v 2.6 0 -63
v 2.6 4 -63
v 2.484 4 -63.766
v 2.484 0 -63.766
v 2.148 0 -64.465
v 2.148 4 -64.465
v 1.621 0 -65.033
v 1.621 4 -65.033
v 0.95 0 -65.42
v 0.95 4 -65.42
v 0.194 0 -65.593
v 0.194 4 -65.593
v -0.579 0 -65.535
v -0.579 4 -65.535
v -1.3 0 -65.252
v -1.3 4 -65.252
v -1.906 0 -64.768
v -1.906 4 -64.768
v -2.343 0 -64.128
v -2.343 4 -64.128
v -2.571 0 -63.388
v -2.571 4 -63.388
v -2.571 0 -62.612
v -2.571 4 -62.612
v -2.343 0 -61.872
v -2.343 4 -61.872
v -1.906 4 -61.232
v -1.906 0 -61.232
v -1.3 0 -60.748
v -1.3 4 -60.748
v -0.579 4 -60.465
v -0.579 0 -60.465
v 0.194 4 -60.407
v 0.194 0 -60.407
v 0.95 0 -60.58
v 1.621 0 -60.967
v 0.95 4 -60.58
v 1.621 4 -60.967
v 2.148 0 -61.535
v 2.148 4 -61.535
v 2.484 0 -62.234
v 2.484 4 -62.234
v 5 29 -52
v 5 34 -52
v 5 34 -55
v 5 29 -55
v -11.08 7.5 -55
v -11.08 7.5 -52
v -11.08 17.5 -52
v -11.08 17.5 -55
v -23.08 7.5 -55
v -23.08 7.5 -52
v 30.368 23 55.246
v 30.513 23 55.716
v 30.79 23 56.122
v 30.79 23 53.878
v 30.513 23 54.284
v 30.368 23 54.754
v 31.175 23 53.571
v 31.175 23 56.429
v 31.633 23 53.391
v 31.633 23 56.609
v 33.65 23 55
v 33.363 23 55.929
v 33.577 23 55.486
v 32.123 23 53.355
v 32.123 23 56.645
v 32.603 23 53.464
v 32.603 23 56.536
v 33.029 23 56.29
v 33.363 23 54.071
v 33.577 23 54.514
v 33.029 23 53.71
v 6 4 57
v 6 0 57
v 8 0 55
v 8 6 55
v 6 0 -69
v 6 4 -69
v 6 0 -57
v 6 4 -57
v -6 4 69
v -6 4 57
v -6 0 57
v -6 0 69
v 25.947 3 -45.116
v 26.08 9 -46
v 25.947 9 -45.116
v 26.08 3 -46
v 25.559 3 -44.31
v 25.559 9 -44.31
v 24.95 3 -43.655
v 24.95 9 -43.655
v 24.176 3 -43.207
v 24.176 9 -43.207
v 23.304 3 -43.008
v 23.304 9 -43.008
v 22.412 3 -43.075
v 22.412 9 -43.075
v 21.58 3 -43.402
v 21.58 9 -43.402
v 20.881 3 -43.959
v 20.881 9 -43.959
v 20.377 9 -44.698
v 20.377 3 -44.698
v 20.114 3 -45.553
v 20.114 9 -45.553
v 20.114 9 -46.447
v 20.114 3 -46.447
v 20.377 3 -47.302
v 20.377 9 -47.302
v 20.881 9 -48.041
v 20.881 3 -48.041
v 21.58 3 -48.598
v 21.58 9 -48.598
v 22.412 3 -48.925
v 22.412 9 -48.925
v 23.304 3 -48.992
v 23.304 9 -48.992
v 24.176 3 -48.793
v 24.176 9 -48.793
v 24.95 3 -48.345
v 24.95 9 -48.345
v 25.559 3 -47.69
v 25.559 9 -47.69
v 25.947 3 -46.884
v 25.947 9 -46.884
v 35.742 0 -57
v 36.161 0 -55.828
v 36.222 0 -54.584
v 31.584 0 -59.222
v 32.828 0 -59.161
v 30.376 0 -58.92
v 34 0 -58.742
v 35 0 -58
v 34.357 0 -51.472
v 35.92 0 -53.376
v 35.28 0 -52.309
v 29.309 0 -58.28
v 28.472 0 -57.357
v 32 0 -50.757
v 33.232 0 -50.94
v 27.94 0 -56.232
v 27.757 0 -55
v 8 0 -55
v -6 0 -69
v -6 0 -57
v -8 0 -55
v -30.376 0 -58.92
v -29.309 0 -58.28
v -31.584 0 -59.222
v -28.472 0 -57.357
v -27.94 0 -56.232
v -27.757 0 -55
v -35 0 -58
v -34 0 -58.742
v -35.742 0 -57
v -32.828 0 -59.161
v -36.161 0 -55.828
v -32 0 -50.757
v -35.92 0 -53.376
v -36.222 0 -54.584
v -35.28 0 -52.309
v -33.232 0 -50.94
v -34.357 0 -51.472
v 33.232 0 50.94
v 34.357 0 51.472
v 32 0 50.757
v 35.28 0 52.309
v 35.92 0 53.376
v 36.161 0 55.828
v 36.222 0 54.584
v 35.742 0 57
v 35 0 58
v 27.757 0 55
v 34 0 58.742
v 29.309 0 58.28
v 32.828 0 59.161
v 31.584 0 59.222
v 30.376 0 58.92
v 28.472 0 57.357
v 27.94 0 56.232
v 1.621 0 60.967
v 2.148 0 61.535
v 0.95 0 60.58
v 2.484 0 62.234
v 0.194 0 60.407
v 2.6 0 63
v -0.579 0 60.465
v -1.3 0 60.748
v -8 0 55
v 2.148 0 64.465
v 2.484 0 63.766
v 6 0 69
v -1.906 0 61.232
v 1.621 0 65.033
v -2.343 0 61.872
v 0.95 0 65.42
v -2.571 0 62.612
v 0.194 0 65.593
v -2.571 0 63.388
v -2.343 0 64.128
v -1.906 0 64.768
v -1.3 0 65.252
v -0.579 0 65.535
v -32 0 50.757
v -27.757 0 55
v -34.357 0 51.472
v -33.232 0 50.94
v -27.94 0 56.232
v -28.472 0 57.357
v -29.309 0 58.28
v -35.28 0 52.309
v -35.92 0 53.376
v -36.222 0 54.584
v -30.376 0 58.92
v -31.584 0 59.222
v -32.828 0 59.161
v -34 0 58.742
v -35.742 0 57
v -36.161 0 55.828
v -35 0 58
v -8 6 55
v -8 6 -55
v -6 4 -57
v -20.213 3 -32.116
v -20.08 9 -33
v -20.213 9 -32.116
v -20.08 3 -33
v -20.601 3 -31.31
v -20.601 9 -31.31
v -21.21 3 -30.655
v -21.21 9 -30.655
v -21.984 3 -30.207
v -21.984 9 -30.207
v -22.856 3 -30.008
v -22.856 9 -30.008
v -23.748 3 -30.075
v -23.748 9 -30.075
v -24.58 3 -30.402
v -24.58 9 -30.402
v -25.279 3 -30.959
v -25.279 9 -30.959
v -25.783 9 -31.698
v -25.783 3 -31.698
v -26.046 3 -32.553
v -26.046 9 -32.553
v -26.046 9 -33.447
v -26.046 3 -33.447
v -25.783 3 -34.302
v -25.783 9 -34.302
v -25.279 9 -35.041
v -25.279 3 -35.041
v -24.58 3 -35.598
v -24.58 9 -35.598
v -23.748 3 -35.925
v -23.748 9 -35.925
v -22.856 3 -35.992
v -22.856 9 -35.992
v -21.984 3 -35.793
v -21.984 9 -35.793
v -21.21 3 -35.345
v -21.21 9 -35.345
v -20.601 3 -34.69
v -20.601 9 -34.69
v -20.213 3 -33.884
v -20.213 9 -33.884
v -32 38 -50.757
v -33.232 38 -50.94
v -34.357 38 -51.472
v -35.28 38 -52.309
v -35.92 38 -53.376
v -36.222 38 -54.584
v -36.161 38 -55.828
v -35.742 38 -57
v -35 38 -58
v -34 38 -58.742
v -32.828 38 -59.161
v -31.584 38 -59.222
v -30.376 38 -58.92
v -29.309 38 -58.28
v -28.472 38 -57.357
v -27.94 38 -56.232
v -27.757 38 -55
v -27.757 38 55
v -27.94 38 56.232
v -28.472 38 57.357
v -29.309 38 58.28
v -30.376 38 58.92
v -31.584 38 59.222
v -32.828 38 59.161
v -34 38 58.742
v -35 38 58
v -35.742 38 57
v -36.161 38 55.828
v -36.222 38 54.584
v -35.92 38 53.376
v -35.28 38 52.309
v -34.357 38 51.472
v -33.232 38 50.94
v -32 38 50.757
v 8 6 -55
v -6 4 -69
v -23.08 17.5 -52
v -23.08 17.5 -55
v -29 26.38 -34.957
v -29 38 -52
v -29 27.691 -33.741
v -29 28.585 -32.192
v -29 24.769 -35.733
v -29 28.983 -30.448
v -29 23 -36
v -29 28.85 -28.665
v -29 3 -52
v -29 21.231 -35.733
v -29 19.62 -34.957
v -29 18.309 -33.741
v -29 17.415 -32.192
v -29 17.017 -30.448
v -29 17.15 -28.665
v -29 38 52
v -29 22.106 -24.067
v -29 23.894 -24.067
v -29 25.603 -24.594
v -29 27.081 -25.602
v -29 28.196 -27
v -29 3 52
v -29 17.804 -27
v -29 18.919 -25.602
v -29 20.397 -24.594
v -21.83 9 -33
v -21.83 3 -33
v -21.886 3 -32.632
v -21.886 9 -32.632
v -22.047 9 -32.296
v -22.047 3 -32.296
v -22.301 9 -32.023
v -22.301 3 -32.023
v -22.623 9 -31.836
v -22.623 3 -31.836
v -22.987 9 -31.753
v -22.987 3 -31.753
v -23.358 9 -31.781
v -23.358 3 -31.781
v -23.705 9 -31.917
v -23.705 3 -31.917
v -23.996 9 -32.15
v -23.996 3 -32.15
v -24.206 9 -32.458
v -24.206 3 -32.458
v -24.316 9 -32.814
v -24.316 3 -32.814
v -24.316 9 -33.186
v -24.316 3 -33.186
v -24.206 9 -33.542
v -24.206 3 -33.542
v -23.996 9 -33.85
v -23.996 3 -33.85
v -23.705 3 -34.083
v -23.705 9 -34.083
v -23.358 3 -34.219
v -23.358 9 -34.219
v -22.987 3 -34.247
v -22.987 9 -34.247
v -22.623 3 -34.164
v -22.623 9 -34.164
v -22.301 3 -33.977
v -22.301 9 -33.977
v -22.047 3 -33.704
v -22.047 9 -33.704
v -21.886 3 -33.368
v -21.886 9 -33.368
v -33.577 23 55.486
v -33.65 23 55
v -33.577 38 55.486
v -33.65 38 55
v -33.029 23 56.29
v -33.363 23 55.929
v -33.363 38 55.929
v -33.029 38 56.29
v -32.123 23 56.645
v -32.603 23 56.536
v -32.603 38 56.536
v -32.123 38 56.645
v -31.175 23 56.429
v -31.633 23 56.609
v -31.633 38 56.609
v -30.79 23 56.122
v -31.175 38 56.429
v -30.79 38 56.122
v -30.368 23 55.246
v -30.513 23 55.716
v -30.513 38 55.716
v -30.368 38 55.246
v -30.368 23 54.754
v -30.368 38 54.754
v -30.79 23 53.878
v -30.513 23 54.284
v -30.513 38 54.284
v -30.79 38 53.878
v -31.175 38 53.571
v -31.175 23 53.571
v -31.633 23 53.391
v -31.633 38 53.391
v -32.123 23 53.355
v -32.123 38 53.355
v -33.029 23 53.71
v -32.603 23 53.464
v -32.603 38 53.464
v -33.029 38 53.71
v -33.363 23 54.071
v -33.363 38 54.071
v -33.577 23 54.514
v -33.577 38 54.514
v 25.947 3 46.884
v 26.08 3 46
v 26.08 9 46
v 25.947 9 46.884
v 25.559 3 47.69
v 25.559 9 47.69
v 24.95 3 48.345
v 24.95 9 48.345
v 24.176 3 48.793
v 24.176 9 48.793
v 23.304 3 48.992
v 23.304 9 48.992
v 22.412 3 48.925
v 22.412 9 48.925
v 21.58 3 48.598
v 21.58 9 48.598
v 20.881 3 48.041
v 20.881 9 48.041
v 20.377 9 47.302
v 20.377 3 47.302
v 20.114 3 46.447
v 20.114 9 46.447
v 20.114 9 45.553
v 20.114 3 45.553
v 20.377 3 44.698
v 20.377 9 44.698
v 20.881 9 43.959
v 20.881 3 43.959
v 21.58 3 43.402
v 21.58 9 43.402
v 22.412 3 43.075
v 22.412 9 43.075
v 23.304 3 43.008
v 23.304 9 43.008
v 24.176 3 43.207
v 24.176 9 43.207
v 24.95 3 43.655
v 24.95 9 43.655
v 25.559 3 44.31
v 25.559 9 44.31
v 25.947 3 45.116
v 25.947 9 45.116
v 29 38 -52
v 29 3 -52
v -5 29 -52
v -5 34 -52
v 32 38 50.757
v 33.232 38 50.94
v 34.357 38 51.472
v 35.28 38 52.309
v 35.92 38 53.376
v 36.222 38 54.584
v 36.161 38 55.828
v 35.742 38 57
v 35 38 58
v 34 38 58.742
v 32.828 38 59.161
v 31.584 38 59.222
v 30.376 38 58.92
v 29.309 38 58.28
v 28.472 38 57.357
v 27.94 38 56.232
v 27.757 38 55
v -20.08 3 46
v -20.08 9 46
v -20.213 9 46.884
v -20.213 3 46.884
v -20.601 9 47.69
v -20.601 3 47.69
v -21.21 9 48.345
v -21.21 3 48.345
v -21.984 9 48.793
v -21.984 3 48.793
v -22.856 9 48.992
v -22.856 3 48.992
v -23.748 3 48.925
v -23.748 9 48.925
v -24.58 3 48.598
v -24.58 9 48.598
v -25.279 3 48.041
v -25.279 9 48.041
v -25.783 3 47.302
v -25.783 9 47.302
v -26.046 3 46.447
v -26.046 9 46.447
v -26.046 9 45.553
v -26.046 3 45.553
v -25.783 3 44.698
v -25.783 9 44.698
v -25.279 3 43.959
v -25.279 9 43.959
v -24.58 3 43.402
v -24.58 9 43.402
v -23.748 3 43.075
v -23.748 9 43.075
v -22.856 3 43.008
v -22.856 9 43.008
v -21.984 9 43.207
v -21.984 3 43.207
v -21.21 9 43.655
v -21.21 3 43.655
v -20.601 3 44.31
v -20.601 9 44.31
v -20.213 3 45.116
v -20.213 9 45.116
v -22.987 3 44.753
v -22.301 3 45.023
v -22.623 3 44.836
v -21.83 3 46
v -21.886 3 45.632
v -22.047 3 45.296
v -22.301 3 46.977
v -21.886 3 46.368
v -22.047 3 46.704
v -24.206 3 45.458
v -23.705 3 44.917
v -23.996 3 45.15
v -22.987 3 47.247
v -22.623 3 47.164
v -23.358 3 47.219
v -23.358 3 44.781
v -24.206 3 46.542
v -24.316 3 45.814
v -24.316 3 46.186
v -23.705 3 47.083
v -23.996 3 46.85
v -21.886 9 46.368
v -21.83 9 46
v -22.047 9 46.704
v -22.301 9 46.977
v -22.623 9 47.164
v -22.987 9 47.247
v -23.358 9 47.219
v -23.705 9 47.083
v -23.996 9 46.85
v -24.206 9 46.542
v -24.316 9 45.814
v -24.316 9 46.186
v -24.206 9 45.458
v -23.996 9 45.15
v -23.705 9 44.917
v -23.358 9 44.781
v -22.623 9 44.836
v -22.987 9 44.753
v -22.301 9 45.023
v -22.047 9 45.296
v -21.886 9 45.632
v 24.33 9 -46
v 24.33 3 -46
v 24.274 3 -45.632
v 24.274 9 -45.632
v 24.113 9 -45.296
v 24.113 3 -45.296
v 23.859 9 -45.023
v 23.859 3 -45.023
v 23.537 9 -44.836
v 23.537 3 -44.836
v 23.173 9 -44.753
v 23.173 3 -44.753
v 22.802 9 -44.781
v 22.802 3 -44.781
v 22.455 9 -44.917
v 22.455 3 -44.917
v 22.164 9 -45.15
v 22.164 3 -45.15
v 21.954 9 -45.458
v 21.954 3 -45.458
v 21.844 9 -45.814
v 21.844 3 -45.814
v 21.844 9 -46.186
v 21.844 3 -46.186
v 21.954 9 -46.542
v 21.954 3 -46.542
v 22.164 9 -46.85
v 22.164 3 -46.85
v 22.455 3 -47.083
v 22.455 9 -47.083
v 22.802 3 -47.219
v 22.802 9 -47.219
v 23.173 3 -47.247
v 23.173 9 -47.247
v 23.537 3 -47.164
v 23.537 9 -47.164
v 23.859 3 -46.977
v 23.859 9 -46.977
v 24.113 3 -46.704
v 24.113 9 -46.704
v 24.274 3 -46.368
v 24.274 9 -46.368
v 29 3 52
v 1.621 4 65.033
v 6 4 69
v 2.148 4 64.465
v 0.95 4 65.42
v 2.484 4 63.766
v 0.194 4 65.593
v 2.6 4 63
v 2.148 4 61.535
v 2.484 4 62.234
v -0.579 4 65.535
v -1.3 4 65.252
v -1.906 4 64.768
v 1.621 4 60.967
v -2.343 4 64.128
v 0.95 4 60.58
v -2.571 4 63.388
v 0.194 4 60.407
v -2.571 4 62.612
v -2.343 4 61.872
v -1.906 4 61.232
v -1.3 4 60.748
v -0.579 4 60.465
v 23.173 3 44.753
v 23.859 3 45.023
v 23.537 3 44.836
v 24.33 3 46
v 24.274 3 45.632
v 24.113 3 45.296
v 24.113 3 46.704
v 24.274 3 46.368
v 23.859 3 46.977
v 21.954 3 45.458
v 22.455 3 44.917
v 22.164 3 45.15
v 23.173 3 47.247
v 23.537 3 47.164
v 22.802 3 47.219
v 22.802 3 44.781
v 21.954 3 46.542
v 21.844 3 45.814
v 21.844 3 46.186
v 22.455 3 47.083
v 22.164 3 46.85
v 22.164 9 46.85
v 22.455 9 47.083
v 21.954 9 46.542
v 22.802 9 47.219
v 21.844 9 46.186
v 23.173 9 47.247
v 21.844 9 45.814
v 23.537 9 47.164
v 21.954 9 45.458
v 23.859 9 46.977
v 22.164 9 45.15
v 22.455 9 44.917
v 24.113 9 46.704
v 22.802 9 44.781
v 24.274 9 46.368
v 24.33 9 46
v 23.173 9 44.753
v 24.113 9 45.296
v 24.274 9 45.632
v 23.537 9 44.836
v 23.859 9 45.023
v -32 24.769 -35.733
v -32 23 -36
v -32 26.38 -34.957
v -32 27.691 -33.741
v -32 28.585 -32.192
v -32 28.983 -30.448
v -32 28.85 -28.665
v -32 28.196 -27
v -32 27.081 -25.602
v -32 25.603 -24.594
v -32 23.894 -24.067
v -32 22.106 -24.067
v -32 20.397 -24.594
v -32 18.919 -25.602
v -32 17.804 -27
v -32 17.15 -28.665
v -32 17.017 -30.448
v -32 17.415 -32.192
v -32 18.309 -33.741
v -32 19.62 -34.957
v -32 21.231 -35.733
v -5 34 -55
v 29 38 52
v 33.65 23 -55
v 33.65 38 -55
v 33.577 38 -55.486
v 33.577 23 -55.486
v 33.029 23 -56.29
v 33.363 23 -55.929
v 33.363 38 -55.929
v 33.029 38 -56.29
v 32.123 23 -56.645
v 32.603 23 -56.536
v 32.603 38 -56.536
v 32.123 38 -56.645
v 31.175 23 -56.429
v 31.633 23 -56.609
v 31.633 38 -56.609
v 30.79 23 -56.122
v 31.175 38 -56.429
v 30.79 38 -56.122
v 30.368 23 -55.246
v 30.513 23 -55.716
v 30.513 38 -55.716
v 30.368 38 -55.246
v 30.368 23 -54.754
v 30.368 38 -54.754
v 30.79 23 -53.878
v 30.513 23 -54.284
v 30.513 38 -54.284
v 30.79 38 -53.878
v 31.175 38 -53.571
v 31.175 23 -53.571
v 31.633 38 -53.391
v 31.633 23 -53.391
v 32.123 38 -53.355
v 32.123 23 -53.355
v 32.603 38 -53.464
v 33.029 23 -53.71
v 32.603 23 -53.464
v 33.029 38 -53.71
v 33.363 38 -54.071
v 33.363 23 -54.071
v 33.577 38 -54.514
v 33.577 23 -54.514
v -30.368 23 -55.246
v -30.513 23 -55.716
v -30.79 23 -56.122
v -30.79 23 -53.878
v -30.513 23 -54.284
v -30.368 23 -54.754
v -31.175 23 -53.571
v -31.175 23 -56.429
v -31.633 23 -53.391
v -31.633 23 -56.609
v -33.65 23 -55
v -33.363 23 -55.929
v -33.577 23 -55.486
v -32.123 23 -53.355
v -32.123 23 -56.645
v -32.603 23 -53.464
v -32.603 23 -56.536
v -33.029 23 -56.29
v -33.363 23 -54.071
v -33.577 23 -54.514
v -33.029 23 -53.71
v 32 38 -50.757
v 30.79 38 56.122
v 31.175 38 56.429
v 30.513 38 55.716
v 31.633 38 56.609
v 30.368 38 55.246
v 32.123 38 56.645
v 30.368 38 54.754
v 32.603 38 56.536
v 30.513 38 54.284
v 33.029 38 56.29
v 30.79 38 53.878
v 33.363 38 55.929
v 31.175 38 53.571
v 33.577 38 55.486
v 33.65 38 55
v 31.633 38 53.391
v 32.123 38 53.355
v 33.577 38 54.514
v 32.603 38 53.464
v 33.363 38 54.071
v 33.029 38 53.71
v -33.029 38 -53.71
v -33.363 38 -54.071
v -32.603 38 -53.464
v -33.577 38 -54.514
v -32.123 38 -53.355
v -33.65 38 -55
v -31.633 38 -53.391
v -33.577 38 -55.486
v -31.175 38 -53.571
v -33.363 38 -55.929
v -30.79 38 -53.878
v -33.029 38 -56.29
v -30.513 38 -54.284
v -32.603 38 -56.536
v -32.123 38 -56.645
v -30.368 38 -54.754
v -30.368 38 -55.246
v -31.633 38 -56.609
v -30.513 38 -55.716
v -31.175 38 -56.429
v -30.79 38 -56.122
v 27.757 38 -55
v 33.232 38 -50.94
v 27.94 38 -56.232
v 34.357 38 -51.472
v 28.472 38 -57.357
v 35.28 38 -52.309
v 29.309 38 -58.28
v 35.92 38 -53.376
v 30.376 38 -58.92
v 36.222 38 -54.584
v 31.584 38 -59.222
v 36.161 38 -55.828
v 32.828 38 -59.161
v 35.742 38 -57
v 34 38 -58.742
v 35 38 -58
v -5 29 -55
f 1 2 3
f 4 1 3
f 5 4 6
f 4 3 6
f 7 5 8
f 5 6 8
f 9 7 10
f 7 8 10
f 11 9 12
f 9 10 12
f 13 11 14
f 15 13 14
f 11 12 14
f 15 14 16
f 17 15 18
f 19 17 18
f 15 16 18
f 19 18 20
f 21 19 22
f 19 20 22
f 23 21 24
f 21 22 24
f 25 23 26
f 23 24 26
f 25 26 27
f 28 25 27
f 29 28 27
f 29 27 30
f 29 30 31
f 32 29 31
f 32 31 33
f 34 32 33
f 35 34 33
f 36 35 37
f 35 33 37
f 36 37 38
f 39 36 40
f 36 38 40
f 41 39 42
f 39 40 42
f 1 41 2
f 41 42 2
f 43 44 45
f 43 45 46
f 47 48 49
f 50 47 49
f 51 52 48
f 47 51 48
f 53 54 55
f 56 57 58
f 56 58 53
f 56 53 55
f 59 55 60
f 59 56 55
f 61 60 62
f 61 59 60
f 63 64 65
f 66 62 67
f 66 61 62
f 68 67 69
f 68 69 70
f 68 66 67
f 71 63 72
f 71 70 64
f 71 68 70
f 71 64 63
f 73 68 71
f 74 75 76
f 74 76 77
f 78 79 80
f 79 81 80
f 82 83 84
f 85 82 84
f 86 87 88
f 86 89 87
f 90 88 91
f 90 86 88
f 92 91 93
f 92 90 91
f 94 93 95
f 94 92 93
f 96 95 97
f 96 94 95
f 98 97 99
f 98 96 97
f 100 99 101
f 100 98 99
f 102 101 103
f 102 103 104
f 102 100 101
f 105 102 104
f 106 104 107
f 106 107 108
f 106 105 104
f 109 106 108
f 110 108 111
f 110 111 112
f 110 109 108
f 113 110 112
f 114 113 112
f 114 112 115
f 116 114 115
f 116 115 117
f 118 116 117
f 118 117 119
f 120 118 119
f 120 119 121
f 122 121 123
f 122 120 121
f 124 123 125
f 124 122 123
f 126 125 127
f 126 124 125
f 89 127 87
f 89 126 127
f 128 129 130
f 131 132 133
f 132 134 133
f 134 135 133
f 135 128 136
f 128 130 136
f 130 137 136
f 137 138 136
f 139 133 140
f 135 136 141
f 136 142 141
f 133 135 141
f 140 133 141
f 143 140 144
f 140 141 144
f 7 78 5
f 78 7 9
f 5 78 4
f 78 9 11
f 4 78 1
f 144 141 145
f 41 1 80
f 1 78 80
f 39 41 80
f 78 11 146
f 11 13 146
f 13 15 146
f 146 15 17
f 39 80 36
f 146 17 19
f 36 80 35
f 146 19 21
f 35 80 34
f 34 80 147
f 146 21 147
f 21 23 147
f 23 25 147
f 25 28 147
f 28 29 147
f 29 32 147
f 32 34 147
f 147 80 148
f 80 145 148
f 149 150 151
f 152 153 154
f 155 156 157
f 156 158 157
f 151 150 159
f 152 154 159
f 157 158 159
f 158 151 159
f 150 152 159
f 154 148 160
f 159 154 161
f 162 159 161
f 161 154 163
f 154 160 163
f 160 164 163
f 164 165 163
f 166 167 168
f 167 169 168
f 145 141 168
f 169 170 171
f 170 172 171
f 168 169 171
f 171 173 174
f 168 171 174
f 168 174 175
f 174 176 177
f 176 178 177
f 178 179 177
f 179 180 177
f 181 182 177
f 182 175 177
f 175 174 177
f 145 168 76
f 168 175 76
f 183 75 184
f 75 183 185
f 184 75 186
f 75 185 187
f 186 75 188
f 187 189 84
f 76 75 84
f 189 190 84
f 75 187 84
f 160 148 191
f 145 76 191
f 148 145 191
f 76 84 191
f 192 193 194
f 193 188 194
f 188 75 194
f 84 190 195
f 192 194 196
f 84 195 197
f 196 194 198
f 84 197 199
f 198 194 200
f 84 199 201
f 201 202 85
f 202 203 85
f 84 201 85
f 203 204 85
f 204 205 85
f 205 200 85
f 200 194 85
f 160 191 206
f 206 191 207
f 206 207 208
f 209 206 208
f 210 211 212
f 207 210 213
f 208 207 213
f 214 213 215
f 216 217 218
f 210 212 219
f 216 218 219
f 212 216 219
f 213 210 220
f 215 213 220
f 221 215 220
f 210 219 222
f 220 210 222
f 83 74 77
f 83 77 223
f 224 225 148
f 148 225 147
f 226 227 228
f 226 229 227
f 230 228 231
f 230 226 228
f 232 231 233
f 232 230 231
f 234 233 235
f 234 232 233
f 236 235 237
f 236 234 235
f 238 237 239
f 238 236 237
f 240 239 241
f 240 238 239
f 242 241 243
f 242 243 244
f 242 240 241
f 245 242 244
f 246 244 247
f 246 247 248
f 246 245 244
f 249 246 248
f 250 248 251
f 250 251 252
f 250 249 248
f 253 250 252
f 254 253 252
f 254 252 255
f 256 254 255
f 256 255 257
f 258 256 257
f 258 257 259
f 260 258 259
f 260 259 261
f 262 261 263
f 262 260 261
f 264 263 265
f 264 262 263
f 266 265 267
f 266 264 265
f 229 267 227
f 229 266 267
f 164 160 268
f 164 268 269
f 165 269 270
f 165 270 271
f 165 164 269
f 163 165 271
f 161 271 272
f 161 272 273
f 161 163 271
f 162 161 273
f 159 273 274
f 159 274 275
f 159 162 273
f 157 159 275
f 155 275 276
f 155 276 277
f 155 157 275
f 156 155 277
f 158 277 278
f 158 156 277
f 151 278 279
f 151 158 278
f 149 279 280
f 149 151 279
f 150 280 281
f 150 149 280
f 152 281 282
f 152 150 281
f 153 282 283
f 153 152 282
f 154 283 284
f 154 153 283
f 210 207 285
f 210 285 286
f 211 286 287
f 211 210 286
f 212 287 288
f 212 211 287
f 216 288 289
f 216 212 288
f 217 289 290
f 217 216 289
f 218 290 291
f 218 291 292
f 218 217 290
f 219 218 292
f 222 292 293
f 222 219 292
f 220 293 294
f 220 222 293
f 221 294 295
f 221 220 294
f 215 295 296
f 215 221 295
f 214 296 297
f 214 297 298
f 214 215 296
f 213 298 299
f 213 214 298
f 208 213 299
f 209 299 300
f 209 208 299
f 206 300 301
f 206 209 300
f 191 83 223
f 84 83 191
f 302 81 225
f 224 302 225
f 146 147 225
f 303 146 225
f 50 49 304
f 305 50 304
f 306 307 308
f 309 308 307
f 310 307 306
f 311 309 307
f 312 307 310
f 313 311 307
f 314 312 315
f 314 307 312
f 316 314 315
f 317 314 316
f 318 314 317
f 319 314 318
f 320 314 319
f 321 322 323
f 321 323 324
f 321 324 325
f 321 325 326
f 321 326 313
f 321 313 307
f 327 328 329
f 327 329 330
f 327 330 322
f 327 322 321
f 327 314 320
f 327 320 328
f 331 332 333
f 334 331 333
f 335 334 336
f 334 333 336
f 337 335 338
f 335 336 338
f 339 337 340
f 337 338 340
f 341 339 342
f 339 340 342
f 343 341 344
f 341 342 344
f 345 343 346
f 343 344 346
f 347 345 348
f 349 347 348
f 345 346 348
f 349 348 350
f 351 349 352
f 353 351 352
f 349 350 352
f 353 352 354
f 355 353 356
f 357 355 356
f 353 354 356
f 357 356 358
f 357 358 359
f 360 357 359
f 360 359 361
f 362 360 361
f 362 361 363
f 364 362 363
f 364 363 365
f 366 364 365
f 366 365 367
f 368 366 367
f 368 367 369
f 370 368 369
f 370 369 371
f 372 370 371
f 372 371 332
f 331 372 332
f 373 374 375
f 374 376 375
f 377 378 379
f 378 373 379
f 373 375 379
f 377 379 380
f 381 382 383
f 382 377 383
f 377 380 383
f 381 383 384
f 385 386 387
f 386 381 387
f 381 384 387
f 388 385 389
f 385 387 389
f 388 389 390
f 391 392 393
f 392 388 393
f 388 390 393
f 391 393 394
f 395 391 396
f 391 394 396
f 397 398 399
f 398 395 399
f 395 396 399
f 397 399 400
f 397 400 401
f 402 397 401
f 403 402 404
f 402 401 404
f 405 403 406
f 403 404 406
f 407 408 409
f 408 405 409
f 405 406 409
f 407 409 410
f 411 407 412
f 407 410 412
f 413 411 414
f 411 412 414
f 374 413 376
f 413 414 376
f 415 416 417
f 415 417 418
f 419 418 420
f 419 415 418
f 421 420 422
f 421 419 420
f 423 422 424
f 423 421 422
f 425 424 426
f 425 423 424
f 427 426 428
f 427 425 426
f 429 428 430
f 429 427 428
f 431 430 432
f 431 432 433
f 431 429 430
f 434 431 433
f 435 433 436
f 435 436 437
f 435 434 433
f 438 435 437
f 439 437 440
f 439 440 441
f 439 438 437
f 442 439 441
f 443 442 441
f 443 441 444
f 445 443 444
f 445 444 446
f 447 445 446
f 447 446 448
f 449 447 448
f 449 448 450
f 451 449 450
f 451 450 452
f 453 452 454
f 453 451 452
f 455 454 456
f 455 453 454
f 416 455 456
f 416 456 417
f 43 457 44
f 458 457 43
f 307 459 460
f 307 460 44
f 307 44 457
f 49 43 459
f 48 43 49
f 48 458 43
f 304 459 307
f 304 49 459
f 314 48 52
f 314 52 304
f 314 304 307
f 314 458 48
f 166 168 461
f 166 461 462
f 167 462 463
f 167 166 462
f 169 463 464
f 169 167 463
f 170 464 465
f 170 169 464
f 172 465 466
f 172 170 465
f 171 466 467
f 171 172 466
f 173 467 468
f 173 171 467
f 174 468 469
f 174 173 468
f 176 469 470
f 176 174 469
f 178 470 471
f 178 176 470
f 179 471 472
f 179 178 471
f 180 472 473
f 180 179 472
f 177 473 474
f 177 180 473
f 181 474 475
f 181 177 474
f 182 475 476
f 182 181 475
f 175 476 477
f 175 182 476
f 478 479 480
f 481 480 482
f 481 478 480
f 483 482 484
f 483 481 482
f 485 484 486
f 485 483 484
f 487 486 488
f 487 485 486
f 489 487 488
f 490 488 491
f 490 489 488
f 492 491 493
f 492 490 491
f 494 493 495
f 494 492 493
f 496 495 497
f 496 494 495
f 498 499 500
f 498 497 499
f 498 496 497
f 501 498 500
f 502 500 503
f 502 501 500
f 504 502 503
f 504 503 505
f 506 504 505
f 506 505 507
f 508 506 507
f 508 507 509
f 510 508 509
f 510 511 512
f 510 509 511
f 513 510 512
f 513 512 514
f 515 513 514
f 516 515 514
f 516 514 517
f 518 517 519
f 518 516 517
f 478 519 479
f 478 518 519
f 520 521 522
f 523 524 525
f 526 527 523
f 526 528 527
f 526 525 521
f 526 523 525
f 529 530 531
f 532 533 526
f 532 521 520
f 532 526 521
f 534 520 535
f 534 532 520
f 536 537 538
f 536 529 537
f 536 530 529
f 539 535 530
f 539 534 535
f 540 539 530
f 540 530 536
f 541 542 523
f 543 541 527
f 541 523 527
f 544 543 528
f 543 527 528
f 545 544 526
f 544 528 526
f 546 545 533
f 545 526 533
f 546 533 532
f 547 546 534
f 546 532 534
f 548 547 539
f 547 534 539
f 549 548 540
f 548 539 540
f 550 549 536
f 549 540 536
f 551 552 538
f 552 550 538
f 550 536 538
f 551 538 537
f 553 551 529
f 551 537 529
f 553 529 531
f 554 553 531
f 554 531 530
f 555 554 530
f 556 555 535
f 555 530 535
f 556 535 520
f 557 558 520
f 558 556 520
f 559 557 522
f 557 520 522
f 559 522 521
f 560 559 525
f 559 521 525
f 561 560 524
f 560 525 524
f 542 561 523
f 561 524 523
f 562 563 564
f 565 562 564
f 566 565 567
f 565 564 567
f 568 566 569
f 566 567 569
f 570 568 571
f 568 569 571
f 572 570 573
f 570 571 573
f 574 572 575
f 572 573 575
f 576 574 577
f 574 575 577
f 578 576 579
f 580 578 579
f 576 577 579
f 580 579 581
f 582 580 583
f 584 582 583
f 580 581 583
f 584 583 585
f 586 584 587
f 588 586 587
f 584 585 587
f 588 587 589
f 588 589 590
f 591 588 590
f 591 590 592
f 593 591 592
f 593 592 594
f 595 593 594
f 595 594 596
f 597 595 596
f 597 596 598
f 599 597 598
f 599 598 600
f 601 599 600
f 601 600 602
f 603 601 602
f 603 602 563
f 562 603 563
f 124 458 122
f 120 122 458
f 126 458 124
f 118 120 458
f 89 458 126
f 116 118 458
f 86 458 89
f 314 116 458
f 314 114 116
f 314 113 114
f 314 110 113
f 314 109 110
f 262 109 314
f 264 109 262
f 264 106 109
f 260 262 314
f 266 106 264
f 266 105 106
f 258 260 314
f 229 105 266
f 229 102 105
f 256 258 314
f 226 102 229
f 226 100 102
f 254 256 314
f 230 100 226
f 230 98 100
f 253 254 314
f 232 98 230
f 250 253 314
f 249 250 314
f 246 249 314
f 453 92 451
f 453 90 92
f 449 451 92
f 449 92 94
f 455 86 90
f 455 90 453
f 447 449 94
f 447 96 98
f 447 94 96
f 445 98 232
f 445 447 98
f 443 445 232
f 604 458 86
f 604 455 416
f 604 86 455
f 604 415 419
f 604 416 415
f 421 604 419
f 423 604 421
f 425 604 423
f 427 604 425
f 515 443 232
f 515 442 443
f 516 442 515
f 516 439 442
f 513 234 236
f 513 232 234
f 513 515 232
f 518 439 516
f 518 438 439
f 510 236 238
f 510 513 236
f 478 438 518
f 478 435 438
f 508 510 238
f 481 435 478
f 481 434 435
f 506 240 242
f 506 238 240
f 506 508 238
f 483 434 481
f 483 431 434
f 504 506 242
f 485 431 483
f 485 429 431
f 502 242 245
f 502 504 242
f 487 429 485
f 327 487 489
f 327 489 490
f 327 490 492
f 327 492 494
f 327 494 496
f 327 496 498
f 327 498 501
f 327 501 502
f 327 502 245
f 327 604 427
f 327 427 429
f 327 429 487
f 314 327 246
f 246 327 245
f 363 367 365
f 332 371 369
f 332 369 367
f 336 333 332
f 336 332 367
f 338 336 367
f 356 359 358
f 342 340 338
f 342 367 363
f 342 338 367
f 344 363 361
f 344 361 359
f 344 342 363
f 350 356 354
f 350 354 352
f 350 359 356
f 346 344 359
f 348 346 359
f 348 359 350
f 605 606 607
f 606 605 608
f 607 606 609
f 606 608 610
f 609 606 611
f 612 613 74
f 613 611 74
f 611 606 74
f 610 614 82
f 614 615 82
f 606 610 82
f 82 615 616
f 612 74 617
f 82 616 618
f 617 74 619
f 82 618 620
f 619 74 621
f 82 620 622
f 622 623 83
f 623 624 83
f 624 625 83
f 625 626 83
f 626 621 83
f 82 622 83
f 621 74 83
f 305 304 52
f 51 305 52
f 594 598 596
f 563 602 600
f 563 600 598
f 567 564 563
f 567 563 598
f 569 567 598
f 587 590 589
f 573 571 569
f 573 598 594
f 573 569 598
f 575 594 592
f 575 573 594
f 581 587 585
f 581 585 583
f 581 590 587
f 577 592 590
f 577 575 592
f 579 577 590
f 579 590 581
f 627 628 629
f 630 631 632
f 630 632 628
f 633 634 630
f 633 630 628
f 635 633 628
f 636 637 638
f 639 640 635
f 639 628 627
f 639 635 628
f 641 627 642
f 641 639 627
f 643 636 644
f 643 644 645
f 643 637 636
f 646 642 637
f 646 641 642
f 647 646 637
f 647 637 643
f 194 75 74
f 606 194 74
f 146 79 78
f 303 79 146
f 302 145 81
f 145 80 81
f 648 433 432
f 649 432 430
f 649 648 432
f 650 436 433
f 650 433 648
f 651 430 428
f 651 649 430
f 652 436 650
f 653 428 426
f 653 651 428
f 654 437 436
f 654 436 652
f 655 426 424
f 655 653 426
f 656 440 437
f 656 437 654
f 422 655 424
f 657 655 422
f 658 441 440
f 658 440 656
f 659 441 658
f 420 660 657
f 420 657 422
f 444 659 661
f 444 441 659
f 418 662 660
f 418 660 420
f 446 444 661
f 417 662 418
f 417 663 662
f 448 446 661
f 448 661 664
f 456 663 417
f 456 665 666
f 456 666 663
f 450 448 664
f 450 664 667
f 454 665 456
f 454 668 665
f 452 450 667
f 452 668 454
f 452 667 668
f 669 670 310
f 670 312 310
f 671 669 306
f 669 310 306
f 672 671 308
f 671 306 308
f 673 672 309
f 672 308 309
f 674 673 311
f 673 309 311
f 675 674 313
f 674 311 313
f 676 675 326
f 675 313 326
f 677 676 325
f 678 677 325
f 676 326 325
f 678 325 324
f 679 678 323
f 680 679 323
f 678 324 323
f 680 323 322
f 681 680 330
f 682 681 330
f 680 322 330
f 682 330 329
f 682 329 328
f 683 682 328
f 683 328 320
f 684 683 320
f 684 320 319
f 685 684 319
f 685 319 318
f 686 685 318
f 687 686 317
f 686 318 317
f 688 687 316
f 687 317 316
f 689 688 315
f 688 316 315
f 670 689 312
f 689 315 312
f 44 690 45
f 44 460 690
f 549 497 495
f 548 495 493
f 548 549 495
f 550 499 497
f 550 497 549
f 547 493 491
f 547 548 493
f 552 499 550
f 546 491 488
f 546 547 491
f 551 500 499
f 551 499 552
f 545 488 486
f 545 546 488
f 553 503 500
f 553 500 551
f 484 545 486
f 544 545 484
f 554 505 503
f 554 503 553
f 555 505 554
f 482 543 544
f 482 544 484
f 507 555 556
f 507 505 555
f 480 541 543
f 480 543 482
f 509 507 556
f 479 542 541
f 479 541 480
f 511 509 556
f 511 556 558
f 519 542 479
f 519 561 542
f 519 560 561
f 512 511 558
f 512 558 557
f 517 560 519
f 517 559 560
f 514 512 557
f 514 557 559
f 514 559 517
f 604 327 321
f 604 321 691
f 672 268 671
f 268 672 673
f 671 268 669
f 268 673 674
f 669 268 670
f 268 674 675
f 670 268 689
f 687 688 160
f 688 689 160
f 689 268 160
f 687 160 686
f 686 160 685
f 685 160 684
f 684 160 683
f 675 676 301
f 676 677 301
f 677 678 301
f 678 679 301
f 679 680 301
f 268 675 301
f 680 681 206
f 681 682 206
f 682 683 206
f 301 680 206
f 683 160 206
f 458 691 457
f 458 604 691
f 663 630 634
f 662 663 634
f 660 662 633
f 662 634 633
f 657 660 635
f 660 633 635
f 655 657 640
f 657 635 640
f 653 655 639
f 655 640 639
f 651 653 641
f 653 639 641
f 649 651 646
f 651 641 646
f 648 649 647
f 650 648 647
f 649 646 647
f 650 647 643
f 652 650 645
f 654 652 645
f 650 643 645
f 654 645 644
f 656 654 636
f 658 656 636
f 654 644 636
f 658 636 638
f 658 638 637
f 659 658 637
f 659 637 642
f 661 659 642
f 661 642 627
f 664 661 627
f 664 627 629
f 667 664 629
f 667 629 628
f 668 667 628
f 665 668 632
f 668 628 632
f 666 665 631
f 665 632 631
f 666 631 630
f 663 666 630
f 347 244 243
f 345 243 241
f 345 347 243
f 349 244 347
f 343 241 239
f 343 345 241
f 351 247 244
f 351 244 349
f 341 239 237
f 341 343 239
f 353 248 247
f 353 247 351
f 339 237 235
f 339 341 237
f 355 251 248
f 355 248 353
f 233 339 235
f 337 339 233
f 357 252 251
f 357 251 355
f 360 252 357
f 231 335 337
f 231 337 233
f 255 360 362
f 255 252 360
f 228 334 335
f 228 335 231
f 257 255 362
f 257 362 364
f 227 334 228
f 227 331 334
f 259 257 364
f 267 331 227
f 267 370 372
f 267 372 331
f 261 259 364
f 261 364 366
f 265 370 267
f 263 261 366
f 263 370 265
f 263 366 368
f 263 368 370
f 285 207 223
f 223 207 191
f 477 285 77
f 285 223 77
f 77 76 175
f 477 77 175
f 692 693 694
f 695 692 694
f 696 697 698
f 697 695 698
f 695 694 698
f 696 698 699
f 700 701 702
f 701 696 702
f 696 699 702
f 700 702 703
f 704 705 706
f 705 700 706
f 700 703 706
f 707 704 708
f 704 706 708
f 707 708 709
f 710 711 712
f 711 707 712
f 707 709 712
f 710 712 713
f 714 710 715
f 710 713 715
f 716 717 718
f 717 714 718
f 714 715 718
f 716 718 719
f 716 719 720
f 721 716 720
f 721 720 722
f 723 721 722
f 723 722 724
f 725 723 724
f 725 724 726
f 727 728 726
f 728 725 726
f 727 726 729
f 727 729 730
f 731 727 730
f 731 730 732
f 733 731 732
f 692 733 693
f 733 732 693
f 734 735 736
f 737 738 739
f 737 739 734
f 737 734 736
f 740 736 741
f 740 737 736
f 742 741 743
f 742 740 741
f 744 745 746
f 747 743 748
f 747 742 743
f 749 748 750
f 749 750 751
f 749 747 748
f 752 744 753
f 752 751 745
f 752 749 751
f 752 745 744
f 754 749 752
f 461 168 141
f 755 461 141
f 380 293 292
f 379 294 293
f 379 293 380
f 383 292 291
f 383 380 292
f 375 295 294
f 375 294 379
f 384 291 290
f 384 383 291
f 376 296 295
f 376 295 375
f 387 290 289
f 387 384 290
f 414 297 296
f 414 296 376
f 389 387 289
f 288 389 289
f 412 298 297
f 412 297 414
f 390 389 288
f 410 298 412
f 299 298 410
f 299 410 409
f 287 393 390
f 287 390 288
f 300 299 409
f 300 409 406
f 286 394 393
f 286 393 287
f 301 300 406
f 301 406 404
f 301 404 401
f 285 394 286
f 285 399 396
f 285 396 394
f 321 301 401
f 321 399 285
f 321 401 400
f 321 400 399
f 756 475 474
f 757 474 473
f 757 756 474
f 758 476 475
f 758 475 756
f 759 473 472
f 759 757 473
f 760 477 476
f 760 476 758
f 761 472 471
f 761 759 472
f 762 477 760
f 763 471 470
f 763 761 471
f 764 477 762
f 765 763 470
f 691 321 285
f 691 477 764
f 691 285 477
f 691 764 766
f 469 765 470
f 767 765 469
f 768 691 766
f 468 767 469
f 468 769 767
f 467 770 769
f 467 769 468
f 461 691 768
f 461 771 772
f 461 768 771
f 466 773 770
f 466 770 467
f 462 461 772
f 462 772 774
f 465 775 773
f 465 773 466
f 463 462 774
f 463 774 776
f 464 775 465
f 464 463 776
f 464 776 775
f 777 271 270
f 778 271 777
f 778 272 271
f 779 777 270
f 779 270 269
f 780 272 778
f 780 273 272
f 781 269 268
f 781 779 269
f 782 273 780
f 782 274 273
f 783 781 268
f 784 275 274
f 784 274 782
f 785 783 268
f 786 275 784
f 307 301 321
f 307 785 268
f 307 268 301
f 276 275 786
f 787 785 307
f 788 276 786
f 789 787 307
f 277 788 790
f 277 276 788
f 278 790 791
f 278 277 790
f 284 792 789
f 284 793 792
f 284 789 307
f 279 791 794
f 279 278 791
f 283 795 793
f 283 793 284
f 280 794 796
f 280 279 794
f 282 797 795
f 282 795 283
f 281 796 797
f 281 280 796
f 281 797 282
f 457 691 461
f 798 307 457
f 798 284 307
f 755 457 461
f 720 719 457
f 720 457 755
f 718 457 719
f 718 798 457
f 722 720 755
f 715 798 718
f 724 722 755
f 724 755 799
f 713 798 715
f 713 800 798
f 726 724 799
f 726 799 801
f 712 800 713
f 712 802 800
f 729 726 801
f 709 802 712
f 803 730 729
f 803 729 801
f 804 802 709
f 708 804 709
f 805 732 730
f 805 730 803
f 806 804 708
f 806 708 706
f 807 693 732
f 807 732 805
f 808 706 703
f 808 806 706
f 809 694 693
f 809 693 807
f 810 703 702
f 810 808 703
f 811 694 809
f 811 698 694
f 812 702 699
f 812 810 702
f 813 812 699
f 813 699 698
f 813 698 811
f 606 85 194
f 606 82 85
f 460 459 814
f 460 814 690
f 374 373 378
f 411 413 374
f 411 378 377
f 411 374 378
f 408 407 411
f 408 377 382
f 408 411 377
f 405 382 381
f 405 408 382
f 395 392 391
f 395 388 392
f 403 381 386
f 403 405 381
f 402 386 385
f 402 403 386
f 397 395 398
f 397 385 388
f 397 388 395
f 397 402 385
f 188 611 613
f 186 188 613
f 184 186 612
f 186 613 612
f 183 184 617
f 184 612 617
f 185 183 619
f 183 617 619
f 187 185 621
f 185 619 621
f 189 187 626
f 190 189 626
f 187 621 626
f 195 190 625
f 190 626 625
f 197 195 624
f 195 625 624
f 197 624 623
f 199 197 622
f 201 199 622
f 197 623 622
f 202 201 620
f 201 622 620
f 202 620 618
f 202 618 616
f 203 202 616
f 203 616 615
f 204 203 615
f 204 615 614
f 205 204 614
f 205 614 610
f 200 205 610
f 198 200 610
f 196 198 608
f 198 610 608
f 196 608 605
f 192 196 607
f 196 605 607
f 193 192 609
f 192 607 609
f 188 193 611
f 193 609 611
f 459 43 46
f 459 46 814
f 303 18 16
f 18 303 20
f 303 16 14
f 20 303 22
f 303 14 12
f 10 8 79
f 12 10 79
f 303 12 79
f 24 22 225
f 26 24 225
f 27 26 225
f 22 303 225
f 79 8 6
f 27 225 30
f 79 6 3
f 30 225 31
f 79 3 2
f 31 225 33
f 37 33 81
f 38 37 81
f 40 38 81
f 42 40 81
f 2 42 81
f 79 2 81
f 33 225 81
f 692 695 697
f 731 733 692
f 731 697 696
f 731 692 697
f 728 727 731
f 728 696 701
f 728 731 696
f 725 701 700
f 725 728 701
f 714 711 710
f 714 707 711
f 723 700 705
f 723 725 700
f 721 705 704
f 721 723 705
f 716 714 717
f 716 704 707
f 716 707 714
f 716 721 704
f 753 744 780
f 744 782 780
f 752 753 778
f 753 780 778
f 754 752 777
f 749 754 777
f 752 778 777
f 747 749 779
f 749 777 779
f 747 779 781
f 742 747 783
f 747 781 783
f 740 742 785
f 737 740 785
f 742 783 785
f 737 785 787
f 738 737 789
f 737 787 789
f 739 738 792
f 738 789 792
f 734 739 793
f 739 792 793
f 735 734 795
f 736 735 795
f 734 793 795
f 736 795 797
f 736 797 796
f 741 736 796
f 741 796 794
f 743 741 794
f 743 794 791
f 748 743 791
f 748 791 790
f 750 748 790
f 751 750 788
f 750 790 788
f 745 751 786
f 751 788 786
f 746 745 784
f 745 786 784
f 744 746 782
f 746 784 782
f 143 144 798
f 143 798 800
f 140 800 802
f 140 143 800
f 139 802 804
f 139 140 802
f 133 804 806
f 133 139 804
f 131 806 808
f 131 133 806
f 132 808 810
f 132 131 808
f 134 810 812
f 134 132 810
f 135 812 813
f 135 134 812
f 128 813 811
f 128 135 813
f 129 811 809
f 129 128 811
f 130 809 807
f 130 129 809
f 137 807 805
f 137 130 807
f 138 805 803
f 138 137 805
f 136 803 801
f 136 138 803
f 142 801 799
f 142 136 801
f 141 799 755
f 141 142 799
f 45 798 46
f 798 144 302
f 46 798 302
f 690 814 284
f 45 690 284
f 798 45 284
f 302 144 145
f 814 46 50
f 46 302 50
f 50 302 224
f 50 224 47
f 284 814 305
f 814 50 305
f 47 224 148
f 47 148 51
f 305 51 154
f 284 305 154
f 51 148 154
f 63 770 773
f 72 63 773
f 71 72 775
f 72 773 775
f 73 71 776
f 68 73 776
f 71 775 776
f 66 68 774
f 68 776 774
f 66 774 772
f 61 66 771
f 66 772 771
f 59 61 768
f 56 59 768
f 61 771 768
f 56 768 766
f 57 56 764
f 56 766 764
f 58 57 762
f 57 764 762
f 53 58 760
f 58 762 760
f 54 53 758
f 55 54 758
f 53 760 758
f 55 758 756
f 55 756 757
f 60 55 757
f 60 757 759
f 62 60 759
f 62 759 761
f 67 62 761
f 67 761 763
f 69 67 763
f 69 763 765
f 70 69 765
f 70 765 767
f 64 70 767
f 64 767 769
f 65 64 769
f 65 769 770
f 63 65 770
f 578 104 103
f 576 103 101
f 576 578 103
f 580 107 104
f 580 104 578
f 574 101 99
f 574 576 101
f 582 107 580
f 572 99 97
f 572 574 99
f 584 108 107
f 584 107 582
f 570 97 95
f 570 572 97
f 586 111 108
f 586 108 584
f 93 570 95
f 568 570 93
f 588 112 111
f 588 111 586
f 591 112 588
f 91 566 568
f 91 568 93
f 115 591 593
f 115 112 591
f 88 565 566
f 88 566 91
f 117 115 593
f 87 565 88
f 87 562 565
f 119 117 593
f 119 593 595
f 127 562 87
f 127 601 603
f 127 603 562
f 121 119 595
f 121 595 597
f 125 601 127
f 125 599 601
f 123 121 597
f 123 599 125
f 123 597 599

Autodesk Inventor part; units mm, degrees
ref_plane "YZ Plane" through (0, 0, 0) normal (1, 0, 0) x (0, 1, 0)
ref_plane "XZ Plane" through (0, 0, 0) normal (0, 1, 0) x (-1, 0, 0)
ref_plane "XY Plane" through (0, 0, 0) normal (0, 0, 1) x (1, 0, 0)
sketch "Sketch1" plane through (0, 0, 0) normal (0, 1, 0) x (-1, 0, 0)
  line L0 (32, 55) -> (-32, 55)
  line L1 (-32, 55) -> (-32, -55)
  line L2 (-32, -55) -> (32, -55)
  line L3 (32, -55) -> (32, 55)
  line L4 (32, 55) -> (-32, -55) construction
  line L5 (-32, 55) -> (32, -55) construction
  point P0 (0, 0)
  dimension "d0" = 64
  dimension "d1" = 110
extrude "Extrusion1" add sketch "Sketch1" along normal blind 3
sketch "Sketch2" plane through (0, 3, 0) normal (0, 1, 0) x (1, 0, 0)
  line L0 (-32, -55) -> (32, -55) projected
  line L1 (32, -55) -> (32, 55) projected
  line L2 (32, 55) -> (-32, 55) projected
  line L3 (-32, 55) -> (-32, -55) projected
  line L4 (-32, -55) -> (32, -55)
  line L5 (32, -55) -> (32, 55)
  line L6 (32, 55) -> (-32, 55)
  line L7 (-32, 55) -> (-32, -55)
  line L8 (-32, -55) -> (32, 55) construction
  line L9 (32, -55) -> (-32, 55) construction
  line L10 (-29, -52) -> (29, -52)
  line L11 (29, -52) -> (29, 52)
  line L12 (29, 52) -> (-29, 52)
  line L13 (-29, 52) -> (-29, -52)
  point P0 (0, 0)
  dimension "d4" = 3
  dimension "d5" = 3
  dimension "d6" = 3
  dimension "d7" = 3
extrude "Extrusion2" add sketch "Sketch2" along normal blind 35
sketch "Sketch3" plane through (0, 3, 0) normal (0, 1, 0) x (1, 0, 0)
  line L0 (-23.08, -46) -> (23.08, -46)
  line L1 (23.08, -46) -> (23.08, 46)
  line L2 (23.08, 46) -> (-23.08, 46)
  line L3 (-23.08, 46) -> (-23.08, -46)
  circle A0 centre (-23.08, -46) radius 1.25
  circle A1 centre (23.08, -46) radius 1.25
  circle A2 centre (23.08, 46) radius 1.25
  circle A3 centre (-23.08, 33) radius 1.25
  line L4 (-29, -52) -> (-29, 52) projected
  line L5 (29, 52) -> (29, -52) projected
  line L6 (-29, 52) -> (29, 52) projected
  line L7 (29, -52) -> (-29, -52) projected
  circle A4 centre (-23.08, -46) radius 3
  circle A5 centre (-23.08, 33) radius 3
  circle A6 centre (23.08, -46) radius 3
  circle A7 centre (23.08, 46) radius 3
  point P0 (0, 0)
  dimension "d15" = 46.16
  dimension "d16" = 92
  dimension "d17" = 2.5
  dimension "d18" = 2.5
  dimension "d19" = 2.5
  dimension "d20" = 2.5
  dimension "d21" = 79
  dimension "d22" = 5.92
  dimension "d23" = 5.92
  dimension "d24" = 6
  dimension "d25" = 6
  dimension "d26" = 6
  dimension "d27" = 6
  dimension "d28" = 6
  dimension "d29" = 6
extrude "Extrusion3" add sketch "Sketch3" along normal blind 6 contours A0 L3 A4 L0 | L0 A4 L3 A0 | A6 L1 A1 L0 | L0 A1 L1 A6 | A5 L3 A3 | L3 A3 A5 | A7 L2 A2 L1 | L1 A2 L2 A7
sketch "Sketch4" plane through (-29, 3, -52) normal (0, 0, 1) x (1, 0, 0)
  line L0 (8.92, 6) -> (2.92, 6) projected
  line L1 (5.92, 4.5) -> (17.92, 4.5)
  line L2 (17.92, 4.5) -> (17.92, 14.5)
  line L3 (17.92, 14.5) -> (5.92, 14.5)
  line L4 (5.92, 14.5) -> (5.92, 4.5)
  point P0 (29, -3)
  dimension "d33" = 1.5
  dimension "d34" = 10
  dimension "d35" = 12
extrude "Extrusion4" cut sketch "Sketch4" against normal blind 6
sketch "Sketch5" plane through (-29, 3, -52) normal (0, 0, 1) x (1, 0, 0)
  line L0 (17.92, 14.5) -> (17.92, 4.5) projected
  line L1 (17.92, 4.5) -> (5.92, 4.5) projected
  line L2 (5.92, 4.5) -> (5.92, 14.5) projected
  line L3 (5.92, 14.5) -> (17.92, 14.5) projected
  line L4 (58, 0) -> (0, 0) projected
  line L5 (58, 0) -> (58, 35) projected
  line L6 (0, 35) -> (58, 35) projected
  line L7 (0, 0) -> (0, 35) projected
  line L8 (24, 31) -> (34, 31)
  line L9 (34, 31) -> (34, 26)
  line L10 (34, 26) -> (24, 26)
  line L11 (24, 26) -> (24, 31)
  line L12 (8.92, 6) -> (2.92, 6) projected
  point P0 (29, -3)
  dimension "d38" = 20
  dimension "d39" = 5
  dimension "d40" = 10
  dimension "d41" = 24
  dimension "d42" = 24
extrude "Extrusion5" cut sketch "Sketch5" against normal blind 6 contours L8 L9 L10 L11
sketch "Sketch7" plane through (0, 0, 0) normal (0, -1, 0) x (1, 0, 0)
  line L0 (29, 52) -> (-29, 52) projected
  line L1 (-29, 52) -> (-29, -52) projected
  line L2 (-29, -52) -> (29, -52) projected
  line L3 (29, -52) -> (29, 52) projected
  line L4 (29, 52) -> (-29, 52) projected
  line L5 (32, -55) -> (-32, -55) projected
  line L6 (-32, -55) -> (-32, 55) projected
  line L7 (-32, 55) -> (32, 55) projected
  line L8 (32, 55) -> (32, -55) projected
  line L9 (32, 55) -> (32, -55) projected
  circle A0 centre (32, 55) radius 4.2426
  point P0 (0, 0)
extrude "Extrusion6" add sketch "Sketch7" against normal blind 38 contours A0 L7 L8 | A0 L8 L7
sketch "Sketch8" plane through (0, 38, 0) normal (0, 1, 0) x (1, 0, 0)
  arc A0 (27.7574, -55) -> (32, -50.7574) centre (32, -55) ccw projected
  circle A1 centre (32, -55) radius 1.65
  point P0 (0, 0)
  dimension "d47" = 3.3
extrude "Extrusion7" cut sketch "Sketch8" against normal blind 15
mirror "Mirror1" about plane through (0, 0, 0) normal (1, 0, 0) of "Extrusion6", "Extrusion7"
mirror "Mirror2" about plane through (0, 0, 0) normal (0, 0, 1) of "Extrusion6", "Extrusion7", "Mirror1"
sketch "Sketch9" plane through (-29, 3, 52) normal (1, 0, 0) x (0, 0, -1)
  line L0 (88, 6) -> (82, 6) projected
  circle A0 centre (82, 20) radius 6
  line L1 (85, 6) -> (85, 35)
  line L2 (0, 35) -> (104, 35) projected
  line L3 (85, 6) -> (114, 6) construction
  point P0 (52, -3)
  dimension "d50" = 12
  dimension "d51" = 14
  dimension "d52" = 90
  dimension "d53" = 3
extrude "Extrusion8" cut sketch "Sketch9" against normal through all
sketch "Sketch10" plane through (27.7574, 0, -55) normal (0, 0, -1) x (-1, 0, 0)
  line L0 (21.7574, 0) -> (33.7574, 0)
  line L1 (33.7574, 0) -> (33.7574, 4)
  line L2 (33.7574, 4) -> (21.7574, 4)
  line L3 (21.7574, 4) -> (21.7574, 0)
  line L4 (55.5147, 0) -> (55.5147, 38) projected
  line L5 (0, 38) -> (0, 0) projected
  point P0 (27.7574, 0)
  dimension "d56" = 4
  dimension "d57" = 12
  dimension "d58" = 21.7574
  dimension "d59" = 21.7574
extrude "Extrusion9" add sketch "Sketch10" along normal blind 14
chamfer "Chamfer1" distance 2 angle 45 3 edges at (6, 2, -55) (-6, 2, -55) (0, 4, -55)
sketch "Sketch11" plane through (-6, 4, -69) normal (0, 1, 0) x (1, 0, 0)
  line L0 (12, -12) -> (0, -12) projected
  line L1 (12, -12) -> (12, 0) projected
  line L2 (0, 0) -> (12, 0) projected
  line L3 (0, -12) -> (0, 0) projected
  circle A0 centre (6, -6) radius 2.6
  point P0 (6, -69)
  dimension "d65" = 5.2
  dimension "d66" = 6
  dimension "d67" = 6
extrude "Extrusion10" cut sketch "Sketch11" against normal through all contours A0
mirror "Mirror3" about plane through (0, 0, 0) normal (0, 0, 1) of "Extrusion9", "Extrusion10"
chamfer "Chamfer2" distance 2 angle 45 3 edges at (-6, 2, 55) (0, 4, 55) (6, 2, 55)
equation "\"d4\" = d5"
equation "\"d6\" = d5"
equation "\"d7\" = d5"
equation "\"d22\" = d23"
equation "\"d24\" = d25"
equation "\"d27\" = d26"
equation "\"d28\" = d26"
equation "\"d29\" = d26"
equation "\"d41\" = d42"
equation "\"d58\" = d59"
equation "\"d67\" = d66"
properties part number "Podstawa"
